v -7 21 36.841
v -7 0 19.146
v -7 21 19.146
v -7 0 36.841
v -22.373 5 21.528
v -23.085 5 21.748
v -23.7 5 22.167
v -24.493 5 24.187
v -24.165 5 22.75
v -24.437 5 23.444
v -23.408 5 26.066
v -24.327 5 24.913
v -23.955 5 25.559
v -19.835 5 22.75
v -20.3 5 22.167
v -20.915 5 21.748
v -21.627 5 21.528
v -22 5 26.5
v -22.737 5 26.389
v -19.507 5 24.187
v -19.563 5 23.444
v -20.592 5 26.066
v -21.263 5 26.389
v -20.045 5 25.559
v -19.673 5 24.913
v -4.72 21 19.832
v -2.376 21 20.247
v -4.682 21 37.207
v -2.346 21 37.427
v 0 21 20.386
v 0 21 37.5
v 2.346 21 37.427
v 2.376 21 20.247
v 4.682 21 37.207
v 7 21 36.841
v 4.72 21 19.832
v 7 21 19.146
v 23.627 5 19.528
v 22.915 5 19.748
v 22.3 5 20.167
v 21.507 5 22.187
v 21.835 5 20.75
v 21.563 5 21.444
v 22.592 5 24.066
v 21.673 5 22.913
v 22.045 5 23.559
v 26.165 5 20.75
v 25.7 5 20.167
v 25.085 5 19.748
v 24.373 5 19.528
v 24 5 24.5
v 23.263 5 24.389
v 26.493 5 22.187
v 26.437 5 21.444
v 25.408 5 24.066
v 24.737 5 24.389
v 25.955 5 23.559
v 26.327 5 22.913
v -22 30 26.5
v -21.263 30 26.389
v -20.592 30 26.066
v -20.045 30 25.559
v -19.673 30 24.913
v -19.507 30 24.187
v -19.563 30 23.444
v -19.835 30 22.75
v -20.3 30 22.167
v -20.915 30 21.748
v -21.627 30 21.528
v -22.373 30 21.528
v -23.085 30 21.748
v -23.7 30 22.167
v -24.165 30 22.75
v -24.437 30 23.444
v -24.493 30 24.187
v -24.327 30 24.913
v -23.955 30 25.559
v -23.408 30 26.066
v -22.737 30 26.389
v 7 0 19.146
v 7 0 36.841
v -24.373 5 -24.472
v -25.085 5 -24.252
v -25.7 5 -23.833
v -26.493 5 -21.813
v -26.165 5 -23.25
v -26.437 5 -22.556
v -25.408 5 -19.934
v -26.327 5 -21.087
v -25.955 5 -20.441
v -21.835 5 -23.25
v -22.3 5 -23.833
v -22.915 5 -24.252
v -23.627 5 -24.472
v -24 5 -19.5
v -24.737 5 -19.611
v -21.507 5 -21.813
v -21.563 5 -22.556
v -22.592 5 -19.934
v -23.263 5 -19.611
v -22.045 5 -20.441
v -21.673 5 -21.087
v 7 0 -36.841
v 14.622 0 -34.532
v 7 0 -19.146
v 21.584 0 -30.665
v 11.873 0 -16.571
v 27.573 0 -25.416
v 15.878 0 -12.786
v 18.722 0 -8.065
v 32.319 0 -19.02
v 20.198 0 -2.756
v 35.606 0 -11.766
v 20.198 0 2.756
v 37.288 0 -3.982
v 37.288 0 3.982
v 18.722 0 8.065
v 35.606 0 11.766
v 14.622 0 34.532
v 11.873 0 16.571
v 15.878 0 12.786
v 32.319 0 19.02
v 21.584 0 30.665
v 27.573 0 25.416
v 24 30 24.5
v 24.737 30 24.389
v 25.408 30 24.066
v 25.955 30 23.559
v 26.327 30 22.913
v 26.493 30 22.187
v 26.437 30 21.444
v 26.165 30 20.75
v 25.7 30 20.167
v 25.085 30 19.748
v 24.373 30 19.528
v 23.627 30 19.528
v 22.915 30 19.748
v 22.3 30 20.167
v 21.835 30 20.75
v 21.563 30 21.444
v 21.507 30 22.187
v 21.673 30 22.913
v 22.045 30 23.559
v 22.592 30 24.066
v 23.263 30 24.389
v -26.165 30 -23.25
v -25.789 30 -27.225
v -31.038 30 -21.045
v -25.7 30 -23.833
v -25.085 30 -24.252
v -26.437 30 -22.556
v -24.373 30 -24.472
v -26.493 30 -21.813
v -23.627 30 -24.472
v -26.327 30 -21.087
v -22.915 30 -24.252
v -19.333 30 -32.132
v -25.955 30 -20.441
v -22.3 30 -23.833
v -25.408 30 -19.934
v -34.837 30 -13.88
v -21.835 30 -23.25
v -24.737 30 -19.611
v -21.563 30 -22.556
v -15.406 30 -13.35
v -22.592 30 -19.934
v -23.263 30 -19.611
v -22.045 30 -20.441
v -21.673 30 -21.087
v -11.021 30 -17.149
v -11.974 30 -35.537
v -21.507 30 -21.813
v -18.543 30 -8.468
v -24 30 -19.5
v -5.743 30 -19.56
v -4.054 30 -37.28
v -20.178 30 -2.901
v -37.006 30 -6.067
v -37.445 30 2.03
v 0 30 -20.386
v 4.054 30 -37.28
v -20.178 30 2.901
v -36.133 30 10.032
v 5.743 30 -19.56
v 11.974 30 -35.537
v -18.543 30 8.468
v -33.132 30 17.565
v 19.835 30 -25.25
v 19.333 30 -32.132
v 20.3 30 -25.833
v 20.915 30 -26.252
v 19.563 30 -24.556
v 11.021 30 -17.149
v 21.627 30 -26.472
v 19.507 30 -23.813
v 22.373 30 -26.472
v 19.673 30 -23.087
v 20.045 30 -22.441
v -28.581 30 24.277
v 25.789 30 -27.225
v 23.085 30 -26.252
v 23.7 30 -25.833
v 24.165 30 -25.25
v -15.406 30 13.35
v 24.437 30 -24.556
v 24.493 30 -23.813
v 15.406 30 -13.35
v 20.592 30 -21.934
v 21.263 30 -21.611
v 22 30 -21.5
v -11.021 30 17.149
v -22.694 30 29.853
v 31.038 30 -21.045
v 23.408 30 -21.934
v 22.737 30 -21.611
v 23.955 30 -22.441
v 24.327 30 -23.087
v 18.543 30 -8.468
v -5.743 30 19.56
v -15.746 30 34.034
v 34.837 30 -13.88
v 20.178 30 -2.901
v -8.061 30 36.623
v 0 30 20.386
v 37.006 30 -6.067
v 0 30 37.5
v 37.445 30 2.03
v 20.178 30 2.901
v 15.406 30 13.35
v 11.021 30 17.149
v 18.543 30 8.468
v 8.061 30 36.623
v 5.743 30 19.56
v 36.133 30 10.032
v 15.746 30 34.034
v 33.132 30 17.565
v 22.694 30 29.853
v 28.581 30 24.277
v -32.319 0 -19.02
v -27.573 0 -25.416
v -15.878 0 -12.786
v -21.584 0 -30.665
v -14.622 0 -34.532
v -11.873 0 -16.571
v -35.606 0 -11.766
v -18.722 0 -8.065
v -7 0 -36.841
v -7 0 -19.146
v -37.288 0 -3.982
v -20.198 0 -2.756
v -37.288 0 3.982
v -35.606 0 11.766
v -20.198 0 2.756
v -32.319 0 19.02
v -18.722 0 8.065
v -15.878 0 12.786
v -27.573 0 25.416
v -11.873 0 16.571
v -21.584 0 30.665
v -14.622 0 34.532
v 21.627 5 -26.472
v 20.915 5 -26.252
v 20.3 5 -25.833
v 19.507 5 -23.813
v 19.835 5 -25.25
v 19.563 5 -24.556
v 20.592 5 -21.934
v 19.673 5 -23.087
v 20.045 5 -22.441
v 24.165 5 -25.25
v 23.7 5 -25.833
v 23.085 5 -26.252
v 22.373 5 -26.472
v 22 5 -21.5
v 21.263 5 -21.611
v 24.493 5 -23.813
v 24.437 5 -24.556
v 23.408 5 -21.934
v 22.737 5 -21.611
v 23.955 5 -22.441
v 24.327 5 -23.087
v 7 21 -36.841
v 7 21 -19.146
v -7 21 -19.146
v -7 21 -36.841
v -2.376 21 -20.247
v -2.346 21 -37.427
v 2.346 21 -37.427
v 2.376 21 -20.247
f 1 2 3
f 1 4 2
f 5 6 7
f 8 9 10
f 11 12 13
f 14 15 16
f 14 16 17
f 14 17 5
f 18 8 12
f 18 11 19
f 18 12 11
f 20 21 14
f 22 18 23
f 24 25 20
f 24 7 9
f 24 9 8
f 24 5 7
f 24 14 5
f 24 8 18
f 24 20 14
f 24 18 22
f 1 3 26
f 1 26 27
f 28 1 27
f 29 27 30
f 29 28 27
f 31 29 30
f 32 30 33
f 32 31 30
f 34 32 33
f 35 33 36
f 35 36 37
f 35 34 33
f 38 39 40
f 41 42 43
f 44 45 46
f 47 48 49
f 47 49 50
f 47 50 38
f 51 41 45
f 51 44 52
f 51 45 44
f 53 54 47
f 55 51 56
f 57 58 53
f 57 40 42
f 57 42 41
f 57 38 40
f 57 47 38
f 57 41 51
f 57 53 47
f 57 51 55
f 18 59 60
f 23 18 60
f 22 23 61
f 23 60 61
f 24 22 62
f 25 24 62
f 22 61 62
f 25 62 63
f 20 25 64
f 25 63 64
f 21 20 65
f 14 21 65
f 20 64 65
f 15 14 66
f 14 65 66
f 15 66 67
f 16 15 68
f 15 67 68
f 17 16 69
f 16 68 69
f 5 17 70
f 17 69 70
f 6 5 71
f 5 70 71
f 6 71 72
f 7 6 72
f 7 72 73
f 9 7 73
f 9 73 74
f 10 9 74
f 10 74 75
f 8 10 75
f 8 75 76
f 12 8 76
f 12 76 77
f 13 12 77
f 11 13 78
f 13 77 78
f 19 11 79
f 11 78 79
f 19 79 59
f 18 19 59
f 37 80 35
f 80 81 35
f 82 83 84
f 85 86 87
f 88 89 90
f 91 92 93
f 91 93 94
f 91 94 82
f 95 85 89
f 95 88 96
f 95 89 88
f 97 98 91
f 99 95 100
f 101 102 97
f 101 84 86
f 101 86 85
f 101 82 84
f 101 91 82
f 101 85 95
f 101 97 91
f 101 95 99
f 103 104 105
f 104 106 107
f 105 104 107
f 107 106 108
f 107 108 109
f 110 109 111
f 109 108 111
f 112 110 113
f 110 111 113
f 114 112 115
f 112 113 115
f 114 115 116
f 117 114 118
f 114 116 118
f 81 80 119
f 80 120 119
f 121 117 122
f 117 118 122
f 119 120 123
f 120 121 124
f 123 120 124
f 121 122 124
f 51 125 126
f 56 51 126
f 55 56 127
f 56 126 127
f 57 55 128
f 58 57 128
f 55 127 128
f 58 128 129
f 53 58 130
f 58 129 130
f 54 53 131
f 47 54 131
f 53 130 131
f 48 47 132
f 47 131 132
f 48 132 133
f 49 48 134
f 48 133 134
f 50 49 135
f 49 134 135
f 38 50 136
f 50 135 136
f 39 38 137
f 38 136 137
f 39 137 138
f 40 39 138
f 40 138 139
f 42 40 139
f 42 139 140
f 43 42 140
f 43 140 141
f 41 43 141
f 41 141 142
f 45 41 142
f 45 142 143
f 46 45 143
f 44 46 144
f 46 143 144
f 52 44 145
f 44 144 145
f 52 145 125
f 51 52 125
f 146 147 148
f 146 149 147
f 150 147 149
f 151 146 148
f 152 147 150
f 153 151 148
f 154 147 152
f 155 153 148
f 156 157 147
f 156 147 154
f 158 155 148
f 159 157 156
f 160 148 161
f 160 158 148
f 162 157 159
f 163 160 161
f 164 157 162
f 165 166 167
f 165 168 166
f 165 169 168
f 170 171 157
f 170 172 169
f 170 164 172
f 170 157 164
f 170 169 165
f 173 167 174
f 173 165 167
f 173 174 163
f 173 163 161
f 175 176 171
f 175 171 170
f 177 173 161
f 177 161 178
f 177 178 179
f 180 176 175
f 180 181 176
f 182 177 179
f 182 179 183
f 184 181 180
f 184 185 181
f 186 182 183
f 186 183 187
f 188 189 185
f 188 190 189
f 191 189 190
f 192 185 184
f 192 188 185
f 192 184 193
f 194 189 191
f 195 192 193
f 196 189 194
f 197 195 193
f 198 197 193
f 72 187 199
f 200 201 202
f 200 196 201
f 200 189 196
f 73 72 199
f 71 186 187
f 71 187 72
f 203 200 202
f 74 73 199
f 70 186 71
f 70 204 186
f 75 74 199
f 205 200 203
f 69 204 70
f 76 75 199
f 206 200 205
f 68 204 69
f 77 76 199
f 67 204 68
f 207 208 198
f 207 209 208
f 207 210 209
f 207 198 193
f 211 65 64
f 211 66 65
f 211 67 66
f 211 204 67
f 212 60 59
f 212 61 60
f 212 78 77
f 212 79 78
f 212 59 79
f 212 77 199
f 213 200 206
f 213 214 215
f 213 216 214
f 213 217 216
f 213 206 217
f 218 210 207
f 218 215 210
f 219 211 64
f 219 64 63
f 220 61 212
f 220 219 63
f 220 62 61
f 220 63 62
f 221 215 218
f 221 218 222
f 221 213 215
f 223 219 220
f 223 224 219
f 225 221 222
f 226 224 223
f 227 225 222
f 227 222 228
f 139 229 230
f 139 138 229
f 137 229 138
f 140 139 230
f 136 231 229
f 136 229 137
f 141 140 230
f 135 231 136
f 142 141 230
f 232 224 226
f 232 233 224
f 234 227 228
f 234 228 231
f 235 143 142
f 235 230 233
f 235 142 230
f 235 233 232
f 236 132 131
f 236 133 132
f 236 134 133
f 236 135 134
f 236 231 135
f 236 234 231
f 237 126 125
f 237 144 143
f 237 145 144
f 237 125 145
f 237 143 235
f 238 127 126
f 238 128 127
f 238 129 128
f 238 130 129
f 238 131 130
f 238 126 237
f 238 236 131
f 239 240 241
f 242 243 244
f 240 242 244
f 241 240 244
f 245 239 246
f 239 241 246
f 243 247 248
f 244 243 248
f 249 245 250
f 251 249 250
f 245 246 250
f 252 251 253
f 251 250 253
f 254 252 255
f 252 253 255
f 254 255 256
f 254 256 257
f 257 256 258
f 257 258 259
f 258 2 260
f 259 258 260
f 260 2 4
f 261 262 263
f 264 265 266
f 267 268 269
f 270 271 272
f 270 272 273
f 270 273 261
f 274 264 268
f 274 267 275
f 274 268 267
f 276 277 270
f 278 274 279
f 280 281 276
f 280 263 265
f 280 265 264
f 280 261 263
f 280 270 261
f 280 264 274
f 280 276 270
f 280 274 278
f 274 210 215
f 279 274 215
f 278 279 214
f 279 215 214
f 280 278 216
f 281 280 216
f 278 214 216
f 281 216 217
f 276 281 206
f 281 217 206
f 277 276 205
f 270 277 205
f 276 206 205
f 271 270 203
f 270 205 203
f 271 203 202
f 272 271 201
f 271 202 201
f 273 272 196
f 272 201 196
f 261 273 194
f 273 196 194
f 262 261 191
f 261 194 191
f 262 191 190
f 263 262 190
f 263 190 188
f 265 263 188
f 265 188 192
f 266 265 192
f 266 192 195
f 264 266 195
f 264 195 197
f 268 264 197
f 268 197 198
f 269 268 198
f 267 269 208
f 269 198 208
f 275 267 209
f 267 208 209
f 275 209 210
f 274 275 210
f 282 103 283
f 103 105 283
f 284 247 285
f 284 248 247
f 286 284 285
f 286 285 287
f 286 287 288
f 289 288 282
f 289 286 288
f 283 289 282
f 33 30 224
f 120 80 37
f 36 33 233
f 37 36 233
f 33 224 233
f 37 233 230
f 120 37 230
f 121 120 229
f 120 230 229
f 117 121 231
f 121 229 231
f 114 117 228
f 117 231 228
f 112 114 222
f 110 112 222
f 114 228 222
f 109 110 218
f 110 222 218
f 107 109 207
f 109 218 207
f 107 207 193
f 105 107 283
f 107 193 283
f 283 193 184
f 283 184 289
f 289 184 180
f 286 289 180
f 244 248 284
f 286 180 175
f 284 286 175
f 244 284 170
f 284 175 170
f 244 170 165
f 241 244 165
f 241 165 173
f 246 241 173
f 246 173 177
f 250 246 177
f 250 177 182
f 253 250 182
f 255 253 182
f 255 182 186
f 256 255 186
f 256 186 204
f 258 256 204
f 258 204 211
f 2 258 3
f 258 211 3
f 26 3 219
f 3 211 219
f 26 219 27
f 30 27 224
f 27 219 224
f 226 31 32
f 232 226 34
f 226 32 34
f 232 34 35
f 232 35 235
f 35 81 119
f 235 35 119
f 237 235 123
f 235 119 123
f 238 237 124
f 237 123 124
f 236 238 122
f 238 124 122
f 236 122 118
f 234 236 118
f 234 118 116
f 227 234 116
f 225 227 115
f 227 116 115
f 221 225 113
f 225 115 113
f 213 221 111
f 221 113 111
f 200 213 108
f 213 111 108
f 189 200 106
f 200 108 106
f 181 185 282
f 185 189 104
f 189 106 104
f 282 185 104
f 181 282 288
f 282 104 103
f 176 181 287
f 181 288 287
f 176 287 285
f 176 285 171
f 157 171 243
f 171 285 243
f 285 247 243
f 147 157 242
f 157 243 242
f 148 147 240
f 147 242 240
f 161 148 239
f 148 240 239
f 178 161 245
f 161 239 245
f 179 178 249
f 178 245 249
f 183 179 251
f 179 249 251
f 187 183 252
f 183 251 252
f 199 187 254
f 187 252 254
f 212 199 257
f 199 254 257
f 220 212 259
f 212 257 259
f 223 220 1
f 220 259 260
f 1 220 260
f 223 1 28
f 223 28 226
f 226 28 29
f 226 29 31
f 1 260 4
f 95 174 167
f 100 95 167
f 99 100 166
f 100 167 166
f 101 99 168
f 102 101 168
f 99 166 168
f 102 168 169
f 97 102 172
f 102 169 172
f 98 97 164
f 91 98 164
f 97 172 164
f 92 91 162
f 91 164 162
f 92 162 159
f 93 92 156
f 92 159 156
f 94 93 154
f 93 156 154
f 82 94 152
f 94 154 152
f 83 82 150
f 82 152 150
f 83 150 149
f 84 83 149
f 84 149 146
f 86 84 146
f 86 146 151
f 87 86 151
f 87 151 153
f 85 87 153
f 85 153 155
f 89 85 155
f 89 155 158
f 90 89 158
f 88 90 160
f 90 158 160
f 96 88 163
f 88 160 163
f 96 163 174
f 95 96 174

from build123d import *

# Parameters (mm, degrees)
SKETCH2_R           = 37.5
BOSS_EXTRUDE1_DEPTH = 30
SKETCH4_R           = 2.5
CUT_EXTRUDE2_DEPTH  = 25
SKETCH5_W           = 14
SKETCH5_H           = 42
CUT_EXTRUDE3_DEPTH  = 57.5
SKETCH6_R           = 20.385544883
CUT_EXTRUDE4_DEPTH  = 57.5


with BuildPart() as part:
    # Sketch2 → Boss-Extrude1 (new body)
    with BuildSketch(Plane(origin=(0, 0, 0), x_dir=(1, 0, 0), z_dir=(0, 1, 0))):
        with Locations(Location((0, 0, 0), (0, 0, 270))):
            Circle(SKETCH2_R)
    extrude(amount=BOSS_EXTRUDE1_DEPTH)

    # Sketch4 → Cut-Extrude2 (cut)
    with BuildSketch(Plane(origin=(0, 30, 0), x_dir=(1, 0, 0), z_dir=(0, 1, 0))):
        with Locations(Location((22, 24, 0), (0, 0, 270))):
            Circle(SKETCH4_R)
        with Locations(Location((24, -22, 0), (0, 0, 270))):
            Circle(SKETCH4_R)
        with Locations(Location((-22, -24, 0), (0, 0, 270))):
            Circle(SKETCH4_R)
        with Locations(Location((-24, 22, 0), (0, 0, 270))):
            Circle(SKETCH4_R)
    extrude(amount=-CUT_EXTRUDE2_DEPTH, mode=Mode.SUBTRACT)

    # Sketch5 → Cut-Extrude3 (cut, symmetric)
    with BuildSketch(Plane.XY):
        Rectangle(SKETCH5_W, SKETCH5_H)
    extrude(amount=CUT_EXTRUDE3_DEPTH, both=True, mode=Mode.SUBTRACT)

    # Sketch6 → Cut-Extrude4 (cut, symmetric)
    with BuildSketch(Plane(origin=(0, 30, 0), x_dir=(1, 0, 0), z_dir=(0, 1, 0))):
        with Locations(Location((0, 0, 0), (0, 0, 270))):
            Circle(SKETCH6_R)
    extrude(amount=CUT_EXTRUDE4_DEPTH, both=True, mode=Mode.SUBTRACT)


solid = part.part
